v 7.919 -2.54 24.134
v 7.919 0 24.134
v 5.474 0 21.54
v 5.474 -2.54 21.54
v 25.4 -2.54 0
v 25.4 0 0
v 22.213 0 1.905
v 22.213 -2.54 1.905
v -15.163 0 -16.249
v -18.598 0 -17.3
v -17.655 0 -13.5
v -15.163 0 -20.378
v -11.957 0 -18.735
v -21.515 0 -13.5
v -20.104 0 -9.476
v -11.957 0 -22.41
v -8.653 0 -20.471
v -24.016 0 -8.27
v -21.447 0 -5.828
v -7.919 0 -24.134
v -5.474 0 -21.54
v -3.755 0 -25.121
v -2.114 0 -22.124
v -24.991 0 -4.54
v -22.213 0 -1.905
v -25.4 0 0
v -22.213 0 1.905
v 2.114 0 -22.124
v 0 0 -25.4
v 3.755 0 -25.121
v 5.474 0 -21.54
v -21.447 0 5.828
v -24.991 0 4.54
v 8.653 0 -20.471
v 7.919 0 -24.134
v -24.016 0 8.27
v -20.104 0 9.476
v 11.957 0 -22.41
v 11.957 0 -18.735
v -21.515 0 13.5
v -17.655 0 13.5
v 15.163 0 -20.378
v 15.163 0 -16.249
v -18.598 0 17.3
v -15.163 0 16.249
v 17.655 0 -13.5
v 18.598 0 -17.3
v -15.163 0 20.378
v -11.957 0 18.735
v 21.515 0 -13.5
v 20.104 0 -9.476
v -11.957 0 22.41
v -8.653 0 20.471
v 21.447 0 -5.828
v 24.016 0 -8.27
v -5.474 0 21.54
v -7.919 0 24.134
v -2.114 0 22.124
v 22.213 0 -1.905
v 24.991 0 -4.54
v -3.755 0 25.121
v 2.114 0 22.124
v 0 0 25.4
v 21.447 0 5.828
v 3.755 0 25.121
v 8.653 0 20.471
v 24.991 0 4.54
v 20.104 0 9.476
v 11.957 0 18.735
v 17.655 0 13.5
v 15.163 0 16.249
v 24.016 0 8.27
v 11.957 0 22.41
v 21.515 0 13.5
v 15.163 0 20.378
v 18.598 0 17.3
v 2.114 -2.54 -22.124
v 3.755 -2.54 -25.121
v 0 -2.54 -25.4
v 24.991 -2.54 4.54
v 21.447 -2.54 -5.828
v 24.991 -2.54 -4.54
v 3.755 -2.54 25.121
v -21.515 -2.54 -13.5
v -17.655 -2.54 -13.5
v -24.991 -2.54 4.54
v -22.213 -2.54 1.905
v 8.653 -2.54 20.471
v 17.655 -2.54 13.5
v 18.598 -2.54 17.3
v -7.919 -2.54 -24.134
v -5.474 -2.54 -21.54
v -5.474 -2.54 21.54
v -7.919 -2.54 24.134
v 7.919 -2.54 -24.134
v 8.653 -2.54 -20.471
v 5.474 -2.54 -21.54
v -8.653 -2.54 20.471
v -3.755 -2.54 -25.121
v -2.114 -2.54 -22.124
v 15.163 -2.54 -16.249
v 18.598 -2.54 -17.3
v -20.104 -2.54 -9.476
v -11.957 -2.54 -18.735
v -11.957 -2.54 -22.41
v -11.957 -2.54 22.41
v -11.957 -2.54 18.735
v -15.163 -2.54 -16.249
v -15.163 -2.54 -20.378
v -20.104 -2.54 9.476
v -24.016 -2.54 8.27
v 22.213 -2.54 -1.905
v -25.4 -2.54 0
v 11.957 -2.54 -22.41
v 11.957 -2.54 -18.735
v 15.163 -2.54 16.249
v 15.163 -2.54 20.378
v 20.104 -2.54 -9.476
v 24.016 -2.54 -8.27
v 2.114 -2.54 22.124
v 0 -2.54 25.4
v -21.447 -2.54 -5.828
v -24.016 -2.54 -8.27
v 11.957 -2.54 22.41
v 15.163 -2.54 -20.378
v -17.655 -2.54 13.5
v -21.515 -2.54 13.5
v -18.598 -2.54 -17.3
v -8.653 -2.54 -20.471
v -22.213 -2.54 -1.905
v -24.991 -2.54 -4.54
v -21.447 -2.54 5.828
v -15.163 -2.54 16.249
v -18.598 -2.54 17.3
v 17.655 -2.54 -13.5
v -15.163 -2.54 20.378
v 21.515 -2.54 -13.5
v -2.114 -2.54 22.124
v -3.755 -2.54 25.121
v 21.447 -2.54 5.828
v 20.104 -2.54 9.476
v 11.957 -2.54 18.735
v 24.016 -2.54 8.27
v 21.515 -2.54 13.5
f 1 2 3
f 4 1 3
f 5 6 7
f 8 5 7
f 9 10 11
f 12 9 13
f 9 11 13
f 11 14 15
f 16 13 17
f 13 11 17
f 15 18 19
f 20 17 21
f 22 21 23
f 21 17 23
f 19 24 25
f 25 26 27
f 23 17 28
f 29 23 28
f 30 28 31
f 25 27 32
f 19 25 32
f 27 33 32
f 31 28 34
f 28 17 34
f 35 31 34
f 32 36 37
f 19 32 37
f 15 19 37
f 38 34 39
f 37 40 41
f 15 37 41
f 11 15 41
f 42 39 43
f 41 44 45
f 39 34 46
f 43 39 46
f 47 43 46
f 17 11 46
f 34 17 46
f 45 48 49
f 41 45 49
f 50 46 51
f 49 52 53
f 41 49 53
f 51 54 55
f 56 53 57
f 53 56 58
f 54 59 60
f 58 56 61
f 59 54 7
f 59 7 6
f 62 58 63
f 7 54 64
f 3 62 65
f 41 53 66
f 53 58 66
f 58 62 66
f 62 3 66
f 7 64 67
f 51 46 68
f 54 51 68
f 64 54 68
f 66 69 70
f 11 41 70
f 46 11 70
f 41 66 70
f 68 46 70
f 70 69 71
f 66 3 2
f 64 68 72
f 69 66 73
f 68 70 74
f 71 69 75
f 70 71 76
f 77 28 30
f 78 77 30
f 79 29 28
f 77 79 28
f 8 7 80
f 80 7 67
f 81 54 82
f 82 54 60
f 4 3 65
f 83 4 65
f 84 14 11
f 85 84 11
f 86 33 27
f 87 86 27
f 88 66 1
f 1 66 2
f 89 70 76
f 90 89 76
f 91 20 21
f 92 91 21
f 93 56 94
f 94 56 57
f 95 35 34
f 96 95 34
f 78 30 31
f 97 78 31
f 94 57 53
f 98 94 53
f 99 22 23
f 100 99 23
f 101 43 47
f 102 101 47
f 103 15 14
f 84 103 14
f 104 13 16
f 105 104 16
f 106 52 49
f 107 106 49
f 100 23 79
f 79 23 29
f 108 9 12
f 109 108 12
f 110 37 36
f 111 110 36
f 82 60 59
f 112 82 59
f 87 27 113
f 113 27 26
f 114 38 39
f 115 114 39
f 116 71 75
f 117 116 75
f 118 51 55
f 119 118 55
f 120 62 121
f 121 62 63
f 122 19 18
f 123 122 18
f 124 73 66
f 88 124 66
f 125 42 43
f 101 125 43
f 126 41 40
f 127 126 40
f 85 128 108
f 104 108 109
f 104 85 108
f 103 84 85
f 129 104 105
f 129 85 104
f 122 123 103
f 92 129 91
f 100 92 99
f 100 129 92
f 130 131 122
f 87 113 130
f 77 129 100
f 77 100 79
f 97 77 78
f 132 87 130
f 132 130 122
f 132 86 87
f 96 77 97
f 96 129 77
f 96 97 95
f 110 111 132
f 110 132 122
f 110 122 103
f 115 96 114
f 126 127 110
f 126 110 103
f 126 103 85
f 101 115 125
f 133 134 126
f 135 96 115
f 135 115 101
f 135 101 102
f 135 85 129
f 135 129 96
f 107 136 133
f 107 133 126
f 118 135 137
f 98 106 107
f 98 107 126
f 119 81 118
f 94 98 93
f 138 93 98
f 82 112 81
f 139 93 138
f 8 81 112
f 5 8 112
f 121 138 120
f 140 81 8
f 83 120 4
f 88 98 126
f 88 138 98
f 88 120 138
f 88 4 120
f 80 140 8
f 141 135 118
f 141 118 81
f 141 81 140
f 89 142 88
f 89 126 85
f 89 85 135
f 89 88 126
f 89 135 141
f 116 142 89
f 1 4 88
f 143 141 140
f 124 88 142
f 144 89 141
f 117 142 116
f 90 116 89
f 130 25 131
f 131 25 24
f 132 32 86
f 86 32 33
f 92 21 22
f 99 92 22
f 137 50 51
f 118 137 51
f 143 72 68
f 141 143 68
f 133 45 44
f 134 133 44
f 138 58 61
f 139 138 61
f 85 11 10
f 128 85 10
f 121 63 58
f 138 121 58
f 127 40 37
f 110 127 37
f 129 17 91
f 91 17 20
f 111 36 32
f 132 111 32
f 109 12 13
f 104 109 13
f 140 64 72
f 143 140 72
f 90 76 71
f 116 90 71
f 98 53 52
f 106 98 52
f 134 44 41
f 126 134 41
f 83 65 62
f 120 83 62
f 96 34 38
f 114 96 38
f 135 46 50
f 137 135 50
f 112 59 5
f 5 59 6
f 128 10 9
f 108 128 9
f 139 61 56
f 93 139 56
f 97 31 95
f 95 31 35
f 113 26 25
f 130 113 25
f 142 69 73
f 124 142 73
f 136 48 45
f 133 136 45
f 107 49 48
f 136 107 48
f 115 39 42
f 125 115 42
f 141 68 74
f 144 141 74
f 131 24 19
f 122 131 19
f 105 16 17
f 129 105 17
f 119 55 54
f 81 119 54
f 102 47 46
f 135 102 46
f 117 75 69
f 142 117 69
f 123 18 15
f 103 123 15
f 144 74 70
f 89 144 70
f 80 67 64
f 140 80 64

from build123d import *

# Parameters (mm, degrees)
F1_DEPTH = 2.54


with BuildPart() as f1:
    # F0 (on Front) → F1 (new body)
    with BuildSketch(Plane.XZ):
        Polygon((2.113677, 22.124263), (0, 25.4), (-2.113677, 22.124263), (-3.754936, 25.120917), (-5.474462, 21.540216), (-7.919199, 24.133924), (-8.653282, 20.471232), (-11.956969, 22.409616), (-11.956969, 18.734501), (-15.162867, 20.377621), (-15.162867, 16.249249), (-18.59776, 17.299807), (-17.654823, 13.50029), (-21.515161, 13.50029), (-20.103852, 9.475534), (-24.015887, 8.270258), (-21.447383, 5.827554), (-24.991025, 4.539679), (-22.21337, 1.904508), (-22.148459, 1.842926), (-25.4, 0), (-22.148459, -1.842926), (-22.21337, -1.904508), (-24.991025, -4.539679), (-21.447383, -5.827554), (-24.015887, -8.270258), (-20.103852, -9.475534), (-21.515161, -13.50029), (-17.654823, -13.50029), (-18.59776, -17.299807), (-15.162867, -16.249249), (-15.162867, -20.377621), (-11.956969, -18.734501), (-11.956969, -22.409616), (-8.653282, -20.471232), (-7.919199, -24.133924), (-5.474462, -21.540216), (-3.754936, -25.120917), (-2.113677, -22.124263), (0, -25.4), (2.113677, -22.124263), (3.754936, -25.120917), (5.474462, -21.540216), (7.919199, -24.133924), (8.653282, -20.471232), (11.956969, -22.409616), (11.956969, -18.734501), (15.162867, -20.377621), (15.162867, -16.249249), (18.59776, -17.299807), (17.654823, -13.50029), (21.515161, -13.50029), (20.103852, -9.475534), (24.015887, -8.270258), (21.447383, -5.827554), (24.991025, -4.539679), (22.21337, -1.904508), (22.148459, -1.842926), (25.4, 0), (22.148459, 1.842926), (22.21337, 1.904508), (24.991025, 4.539679), (21.447383, 5.827554), (24.015887, 8.270258), (20.103852, 9.475534), (21.515161, 13.50029), (17.654823, 13.50029), (18.59776, 17.299807), (15.162867, 16.249249), (15.162867, 20.377621), (11.956969, 18.734501), (11.956969, 22.409616), (8.653282, 20.471232), (7.919199, 24.133924), (5.474462, 21.540216), (3.754936, 25.120917), align=None)
        Polygon((25.4, 0), (22.21337, 1.904508), (22.148459, 1.842926), align=None)
        Polygon((-22.148459, 1.842926), (-22.21337, 1.904508), (-25.4, 0), align=None)
        Polygon((22.21337, -1.904508), (25.4, 0), (22.148459, -1.842926), align=None)
        Polygon((-22.148459, -1.842926), (-25.4, 0), (-22.21337, -1.904508), align=None)
    extrude(amount=F1_DEPTH)


solid = f1.part
